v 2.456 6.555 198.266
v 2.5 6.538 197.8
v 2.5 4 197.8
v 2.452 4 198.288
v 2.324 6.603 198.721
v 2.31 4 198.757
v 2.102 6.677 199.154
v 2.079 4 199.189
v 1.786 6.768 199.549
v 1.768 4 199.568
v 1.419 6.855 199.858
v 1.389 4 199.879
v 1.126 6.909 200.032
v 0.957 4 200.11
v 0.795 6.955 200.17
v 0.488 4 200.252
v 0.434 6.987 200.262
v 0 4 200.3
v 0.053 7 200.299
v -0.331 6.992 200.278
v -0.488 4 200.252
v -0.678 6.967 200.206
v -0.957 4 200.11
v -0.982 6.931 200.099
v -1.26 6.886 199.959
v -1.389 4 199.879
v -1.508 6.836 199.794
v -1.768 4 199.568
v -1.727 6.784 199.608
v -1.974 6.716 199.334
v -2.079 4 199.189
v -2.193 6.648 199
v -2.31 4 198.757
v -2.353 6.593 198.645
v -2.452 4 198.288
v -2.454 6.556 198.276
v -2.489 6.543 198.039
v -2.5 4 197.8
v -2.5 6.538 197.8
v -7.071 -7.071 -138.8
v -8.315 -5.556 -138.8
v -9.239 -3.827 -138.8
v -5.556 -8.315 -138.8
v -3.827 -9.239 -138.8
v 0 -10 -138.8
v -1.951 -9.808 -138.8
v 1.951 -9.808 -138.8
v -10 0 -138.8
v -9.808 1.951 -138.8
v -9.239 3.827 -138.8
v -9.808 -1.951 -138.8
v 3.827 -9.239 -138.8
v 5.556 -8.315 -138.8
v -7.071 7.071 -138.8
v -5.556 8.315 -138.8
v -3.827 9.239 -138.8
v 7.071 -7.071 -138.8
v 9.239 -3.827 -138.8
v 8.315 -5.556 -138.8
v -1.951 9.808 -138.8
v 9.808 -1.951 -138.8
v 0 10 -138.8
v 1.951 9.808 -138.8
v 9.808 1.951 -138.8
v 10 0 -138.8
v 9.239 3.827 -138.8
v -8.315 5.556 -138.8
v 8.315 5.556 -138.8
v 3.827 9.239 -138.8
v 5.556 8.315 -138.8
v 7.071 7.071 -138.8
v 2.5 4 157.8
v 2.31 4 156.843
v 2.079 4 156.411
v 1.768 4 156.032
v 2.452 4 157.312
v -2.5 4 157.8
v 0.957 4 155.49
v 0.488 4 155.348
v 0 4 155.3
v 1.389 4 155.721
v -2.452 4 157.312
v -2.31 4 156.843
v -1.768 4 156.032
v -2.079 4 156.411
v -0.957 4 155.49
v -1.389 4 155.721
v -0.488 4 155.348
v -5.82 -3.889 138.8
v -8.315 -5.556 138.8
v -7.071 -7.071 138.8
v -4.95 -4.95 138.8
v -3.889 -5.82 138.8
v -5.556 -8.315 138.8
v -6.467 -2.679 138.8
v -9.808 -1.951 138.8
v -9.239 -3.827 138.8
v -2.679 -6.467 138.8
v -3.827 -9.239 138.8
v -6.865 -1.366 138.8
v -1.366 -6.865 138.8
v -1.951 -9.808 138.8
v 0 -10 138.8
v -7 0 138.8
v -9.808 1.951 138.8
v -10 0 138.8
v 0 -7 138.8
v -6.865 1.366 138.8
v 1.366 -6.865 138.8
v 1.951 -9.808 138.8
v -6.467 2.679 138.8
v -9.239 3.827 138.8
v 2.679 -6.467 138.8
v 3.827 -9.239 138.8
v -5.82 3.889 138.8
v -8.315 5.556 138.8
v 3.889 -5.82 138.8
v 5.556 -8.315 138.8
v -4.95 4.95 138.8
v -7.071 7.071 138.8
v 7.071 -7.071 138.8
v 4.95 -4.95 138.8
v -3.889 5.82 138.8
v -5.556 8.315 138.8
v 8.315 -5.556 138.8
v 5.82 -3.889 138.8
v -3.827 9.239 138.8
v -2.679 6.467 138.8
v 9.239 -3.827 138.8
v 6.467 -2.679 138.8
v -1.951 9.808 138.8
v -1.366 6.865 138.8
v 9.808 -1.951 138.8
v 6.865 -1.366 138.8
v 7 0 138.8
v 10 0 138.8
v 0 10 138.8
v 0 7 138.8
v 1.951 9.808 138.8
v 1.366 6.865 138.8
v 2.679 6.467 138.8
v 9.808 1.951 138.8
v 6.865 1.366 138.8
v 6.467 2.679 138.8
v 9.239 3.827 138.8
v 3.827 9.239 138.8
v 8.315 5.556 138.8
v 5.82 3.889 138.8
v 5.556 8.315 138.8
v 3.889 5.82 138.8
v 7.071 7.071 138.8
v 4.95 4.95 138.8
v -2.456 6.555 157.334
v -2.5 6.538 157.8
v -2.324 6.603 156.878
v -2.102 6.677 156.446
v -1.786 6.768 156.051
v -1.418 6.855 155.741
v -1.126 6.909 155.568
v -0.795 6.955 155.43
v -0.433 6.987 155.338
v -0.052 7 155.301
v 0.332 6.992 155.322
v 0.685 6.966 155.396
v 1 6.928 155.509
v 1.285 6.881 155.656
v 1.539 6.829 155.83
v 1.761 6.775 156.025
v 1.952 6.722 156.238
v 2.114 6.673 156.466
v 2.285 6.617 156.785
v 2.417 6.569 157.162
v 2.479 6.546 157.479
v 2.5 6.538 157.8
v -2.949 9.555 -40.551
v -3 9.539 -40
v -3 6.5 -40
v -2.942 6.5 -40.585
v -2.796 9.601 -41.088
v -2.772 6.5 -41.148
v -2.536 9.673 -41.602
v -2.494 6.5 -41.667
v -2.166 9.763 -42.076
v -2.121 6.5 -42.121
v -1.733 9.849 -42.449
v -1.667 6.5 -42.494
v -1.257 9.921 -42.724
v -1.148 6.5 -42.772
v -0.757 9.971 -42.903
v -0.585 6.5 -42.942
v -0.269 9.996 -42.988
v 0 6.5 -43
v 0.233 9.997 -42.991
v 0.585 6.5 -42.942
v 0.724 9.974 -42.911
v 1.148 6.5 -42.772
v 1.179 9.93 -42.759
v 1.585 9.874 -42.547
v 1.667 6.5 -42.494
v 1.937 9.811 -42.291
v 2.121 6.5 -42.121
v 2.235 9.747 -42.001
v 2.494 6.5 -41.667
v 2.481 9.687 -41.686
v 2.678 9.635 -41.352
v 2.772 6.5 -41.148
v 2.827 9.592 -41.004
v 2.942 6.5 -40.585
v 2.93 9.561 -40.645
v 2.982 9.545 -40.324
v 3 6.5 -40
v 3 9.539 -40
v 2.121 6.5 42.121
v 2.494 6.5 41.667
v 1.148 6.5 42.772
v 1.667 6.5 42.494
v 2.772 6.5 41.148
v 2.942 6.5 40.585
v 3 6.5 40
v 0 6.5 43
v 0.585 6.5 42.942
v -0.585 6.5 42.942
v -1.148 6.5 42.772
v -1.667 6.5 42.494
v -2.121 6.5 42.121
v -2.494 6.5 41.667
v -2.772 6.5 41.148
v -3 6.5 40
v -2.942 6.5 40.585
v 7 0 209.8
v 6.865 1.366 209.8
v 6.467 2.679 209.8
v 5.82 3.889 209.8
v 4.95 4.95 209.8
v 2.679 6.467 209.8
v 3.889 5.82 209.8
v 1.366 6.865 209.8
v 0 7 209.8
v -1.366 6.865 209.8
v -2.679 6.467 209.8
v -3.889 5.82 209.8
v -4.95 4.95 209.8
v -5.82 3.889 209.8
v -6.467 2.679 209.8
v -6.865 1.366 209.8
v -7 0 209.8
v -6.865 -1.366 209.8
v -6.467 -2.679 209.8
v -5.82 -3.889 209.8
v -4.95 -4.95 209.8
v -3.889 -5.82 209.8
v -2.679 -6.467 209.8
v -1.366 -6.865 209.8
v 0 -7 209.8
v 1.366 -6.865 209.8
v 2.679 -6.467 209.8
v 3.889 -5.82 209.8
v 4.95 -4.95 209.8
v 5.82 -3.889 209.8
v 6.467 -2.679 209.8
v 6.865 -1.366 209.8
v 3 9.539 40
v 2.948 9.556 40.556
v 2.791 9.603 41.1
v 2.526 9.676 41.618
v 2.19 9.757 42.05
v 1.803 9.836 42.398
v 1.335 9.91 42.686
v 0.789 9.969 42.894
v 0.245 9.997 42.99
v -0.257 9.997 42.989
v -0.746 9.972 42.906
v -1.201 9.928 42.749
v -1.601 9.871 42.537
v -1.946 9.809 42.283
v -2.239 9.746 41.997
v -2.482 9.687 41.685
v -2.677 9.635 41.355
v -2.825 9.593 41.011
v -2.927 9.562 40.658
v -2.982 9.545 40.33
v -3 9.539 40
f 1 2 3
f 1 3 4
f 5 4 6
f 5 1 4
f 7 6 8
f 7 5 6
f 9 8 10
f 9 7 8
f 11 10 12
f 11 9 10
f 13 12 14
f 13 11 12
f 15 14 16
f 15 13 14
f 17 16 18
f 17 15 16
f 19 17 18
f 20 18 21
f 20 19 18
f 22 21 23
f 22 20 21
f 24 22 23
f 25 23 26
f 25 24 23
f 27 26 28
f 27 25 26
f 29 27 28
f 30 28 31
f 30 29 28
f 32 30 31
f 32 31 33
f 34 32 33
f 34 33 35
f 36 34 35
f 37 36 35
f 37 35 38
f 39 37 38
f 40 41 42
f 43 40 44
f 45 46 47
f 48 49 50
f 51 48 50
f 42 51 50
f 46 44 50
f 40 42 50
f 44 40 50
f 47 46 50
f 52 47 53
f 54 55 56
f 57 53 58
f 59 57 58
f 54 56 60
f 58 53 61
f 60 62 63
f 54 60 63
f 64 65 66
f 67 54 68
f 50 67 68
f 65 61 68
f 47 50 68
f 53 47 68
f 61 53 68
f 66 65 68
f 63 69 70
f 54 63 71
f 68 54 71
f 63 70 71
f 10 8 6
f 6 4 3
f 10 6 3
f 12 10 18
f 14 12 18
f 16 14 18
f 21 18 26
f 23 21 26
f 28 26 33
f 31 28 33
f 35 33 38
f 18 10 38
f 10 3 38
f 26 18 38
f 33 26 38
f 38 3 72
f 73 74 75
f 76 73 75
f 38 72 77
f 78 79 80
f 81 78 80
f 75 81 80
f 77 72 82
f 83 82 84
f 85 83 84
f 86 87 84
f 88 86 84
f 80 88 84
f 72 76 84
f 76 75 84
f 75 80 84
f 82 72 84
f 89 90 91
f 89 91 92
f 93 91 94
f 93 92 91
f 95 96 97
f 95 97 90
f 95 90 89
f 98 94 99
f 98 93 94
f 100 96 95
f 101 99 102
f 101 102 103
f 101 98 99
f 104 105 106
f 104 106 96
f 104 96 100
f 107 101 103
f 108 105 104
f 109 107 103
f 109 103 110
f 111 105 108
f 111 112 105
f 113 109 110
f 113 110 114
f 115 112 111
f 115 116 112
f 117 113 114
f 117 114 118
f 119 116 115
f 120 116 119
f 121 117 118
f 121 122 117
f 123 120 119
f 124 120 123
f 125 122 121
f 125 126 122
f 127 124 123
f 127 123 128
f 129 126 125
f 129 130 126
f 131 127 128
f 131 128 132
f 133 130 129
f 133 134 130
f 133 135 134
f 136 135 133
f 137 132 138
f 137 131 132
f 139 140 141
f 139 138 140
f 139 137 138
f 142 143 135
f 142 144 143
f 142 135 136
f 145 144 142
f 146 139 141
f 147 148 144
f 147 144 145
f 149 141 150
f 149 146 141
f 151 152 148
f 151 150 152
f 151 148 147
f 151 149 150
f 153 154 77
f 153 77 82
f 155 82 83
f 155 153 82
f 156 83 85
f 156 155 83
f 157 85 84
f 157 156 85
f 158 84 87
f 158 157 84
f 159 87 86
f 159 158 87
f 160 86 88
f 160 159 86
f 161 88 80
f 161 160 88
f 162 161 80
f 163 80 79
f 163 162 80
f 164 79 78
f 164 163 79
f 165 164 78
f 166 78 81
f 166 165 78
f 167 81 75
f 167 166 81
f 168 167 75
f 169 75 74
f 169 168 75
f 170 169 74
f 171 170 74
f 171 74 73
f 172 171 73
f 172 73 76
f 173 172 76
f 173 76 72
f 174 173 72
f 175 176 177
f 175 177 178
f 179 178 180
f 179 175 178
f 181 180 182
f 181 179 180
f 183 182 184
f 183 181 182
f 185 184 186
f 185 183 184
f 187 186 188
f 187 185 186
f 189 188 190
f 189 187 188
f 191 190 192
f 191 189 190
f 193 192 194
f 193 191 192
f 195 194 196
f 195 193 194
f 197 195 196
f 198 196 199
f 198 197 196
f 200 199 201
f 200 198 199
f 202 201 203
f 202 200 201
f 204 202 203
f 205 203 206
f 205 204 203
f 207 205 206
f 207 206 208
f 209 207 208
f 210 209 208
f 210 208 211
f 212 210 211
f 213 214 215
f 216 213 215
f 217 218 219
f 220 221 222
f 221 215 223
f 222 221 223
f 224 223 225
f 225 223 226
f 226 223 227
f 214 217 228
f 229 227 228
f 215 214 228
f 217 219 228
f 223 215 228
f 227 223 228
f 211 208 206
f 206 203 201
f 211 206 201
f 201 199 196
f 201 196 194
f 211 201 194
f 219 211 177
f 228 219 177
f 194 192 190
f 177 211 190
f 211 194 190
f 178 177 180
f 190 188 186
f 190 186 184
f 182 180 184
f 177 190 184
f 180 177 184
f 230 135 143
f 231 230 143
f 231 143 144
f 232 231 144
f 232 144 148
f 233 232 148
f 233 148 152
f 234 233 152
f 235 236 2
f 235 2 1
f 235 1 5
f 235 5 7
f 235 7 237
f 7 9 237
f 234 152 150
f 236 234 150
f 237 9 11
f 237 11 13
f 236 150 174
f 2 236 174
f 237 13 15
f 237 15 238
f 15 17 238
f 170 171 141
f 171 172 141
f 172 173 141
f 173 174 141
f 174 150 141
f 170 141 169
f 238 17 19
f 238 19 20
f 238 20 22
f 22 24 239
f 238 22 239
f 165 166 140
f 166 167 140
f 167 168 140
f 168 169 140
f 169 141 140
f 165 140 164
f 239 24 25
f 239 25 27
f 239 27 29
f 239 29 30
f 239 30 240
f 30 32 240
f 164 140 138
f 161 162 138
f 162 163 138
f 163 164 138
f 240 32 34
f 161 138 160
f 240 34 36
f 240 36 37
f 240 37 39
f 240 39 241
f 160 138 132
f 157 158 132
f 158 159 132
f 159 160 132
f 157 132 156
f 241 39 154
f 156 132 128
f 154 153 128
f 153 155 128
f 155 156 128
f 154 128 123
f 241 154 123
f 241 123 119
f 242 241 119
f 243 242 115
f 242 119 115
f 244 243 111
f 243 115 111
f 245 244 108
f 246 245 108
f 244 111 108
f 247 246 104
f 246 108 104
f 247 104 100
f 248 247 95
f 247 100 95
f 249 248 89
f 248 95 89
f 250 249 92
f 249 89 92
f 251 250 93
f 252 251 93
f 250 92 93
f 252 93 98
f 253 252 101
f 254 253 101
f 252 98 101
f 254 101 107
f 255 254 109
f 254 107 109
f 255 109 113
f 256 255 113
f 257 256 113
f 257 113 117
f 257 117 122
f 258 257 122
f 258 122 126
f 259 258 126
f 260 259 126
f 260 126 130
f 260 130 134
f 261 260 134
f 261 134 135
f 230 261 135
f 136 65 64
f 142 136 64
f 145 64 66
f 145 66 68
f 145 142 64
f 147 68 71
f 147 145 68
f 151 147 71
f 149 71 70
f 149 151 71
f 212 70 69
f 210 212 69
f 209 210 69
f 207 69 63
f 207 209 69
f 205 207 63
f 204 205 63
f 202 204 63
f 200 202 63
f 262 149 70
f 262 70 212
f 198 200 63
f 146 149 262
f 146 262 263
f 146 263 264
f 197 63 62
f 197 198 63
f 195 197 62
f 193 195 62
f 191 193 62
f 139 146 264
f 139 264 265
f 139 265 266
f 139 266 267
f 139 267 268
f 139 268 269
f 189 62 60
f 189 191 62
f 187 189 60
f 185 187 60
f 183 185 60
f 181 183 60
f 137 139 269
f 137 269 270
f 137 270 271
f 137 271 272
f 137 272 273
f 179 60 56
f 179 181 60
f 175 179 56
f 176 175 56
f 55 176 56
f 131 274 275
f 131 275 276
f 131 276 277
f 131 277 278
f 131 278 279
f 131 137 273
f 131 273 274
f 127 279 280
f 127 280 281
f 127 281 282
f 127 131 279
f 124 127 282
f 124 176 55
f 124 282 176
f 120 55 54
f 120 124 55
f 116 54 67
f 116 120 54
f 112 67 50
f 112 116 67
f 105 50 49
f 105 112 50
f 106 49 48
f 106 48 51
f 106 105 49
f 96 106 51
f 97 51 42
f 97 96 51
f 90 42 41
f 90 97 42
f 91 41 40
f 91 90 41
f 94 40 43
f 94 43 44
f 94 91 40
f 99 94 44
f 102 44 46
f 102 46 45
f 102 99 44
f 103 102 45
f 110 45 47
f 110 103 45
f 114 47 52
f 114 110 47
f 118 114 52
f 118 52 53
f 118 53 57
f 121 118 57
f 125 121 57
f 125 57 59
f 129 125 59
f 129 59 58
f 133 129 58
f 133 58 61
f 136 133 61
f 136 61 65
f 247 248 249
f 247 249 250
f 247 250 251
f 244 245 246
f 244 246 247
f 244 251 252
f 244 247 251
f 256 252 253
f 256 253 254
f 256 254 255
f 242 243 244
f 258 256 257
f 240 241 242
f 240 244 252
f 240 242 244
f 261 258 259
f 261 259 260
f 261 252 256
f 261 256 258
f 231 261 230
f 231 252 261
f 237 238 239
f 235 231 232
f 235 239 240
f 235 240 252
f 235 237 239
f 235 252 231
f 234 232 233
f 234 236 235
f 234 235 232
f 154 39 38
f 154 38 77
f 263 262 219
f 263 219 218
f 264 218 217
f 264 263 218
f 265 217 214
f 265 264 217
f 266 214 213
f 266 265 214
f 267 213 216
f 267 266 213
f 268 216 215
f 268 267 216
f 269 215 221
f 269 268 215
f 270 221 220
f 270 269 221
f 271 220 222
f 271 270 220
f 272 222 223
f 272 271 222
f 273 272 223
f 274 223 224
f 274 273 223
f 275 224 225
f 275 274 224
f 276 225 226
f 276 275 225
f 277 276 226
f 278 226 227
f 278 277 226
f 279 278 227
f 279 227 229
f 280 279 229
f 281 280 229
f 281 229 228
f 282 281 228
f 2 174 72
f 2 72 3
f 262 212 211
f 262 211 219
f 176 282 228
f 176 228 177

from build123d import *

# Parameters (mm, degrees)
SKETCH1_R           = 10
BOSS_EXTRUDE1_DEPTH = 138.8
SKETCH2_R           = 7
BOSS_EXTRUDE2_DEPTH = 71
CUT_EXTRUDE1_DEPTH  = 3
CUT_EXTRUDE2_DEPTH  = 3.5


with BuildPart() as part:
    # Sketch1 → Boss-Extrude1 (new, symmetric)
    with BuildSketch(Plane.XY):
        Circle(SKETCH1_R)
    extrude(amount=BOSS_EXTRUDE1_DEPTH, both=True)

    # Sketch2 → Boss-Extrude2 (add)
    with BuildSketch(Plane.XY.offset(138.8)):
        Circle(SKETCH2_R)
    extrude(amount=BOSS_EXTRUDE2_DEPTH)

    # Sketch4 → Cut-Extrude1 (cut)
    with BuildSketch(Plane(origin=(0, 7, 0), x_dir=(1, 0, 0), z_dir=(0, 1, 0))):
        with BuildLine():
            Line((-2.5, -197.8), (-2.5, -157.8))
            ThreePointArc((-2.5, -157.8), (0, -155.3), (2.5, -157.8))
            Line((2.5, -157.8), (2.5, -197.8))
            ThreePointArc((2.5, -197.8), (0, -200.3), (-2.5, -197.8))
        make_face()
    extrude(amount=-CUT_EXTRUDE1_DEPTH, mode=Mode.SUBTRACT)

    # Sketch5 → Cut-Extrude2 (cut)
    with BuildSketch(Plane(origin=(0, 10, 0), x_dir=(1, 0, 0), z_dir=(0, 1, 0))):
        with BuildLine():
            Line((-3, -40), (-3, 40))
            ThreePointArc((-3, 40), (0, 43), (3, 40))
            Line((3, 40), (3, -40))
            ThreePointArc((3, -40), (0, -43), (-3, -40))
        make_face()
    extrude(amount=-CUT_EXTRUDE2_DEPTH, mode=Mode.SUBTRACT)


solid = part.part
